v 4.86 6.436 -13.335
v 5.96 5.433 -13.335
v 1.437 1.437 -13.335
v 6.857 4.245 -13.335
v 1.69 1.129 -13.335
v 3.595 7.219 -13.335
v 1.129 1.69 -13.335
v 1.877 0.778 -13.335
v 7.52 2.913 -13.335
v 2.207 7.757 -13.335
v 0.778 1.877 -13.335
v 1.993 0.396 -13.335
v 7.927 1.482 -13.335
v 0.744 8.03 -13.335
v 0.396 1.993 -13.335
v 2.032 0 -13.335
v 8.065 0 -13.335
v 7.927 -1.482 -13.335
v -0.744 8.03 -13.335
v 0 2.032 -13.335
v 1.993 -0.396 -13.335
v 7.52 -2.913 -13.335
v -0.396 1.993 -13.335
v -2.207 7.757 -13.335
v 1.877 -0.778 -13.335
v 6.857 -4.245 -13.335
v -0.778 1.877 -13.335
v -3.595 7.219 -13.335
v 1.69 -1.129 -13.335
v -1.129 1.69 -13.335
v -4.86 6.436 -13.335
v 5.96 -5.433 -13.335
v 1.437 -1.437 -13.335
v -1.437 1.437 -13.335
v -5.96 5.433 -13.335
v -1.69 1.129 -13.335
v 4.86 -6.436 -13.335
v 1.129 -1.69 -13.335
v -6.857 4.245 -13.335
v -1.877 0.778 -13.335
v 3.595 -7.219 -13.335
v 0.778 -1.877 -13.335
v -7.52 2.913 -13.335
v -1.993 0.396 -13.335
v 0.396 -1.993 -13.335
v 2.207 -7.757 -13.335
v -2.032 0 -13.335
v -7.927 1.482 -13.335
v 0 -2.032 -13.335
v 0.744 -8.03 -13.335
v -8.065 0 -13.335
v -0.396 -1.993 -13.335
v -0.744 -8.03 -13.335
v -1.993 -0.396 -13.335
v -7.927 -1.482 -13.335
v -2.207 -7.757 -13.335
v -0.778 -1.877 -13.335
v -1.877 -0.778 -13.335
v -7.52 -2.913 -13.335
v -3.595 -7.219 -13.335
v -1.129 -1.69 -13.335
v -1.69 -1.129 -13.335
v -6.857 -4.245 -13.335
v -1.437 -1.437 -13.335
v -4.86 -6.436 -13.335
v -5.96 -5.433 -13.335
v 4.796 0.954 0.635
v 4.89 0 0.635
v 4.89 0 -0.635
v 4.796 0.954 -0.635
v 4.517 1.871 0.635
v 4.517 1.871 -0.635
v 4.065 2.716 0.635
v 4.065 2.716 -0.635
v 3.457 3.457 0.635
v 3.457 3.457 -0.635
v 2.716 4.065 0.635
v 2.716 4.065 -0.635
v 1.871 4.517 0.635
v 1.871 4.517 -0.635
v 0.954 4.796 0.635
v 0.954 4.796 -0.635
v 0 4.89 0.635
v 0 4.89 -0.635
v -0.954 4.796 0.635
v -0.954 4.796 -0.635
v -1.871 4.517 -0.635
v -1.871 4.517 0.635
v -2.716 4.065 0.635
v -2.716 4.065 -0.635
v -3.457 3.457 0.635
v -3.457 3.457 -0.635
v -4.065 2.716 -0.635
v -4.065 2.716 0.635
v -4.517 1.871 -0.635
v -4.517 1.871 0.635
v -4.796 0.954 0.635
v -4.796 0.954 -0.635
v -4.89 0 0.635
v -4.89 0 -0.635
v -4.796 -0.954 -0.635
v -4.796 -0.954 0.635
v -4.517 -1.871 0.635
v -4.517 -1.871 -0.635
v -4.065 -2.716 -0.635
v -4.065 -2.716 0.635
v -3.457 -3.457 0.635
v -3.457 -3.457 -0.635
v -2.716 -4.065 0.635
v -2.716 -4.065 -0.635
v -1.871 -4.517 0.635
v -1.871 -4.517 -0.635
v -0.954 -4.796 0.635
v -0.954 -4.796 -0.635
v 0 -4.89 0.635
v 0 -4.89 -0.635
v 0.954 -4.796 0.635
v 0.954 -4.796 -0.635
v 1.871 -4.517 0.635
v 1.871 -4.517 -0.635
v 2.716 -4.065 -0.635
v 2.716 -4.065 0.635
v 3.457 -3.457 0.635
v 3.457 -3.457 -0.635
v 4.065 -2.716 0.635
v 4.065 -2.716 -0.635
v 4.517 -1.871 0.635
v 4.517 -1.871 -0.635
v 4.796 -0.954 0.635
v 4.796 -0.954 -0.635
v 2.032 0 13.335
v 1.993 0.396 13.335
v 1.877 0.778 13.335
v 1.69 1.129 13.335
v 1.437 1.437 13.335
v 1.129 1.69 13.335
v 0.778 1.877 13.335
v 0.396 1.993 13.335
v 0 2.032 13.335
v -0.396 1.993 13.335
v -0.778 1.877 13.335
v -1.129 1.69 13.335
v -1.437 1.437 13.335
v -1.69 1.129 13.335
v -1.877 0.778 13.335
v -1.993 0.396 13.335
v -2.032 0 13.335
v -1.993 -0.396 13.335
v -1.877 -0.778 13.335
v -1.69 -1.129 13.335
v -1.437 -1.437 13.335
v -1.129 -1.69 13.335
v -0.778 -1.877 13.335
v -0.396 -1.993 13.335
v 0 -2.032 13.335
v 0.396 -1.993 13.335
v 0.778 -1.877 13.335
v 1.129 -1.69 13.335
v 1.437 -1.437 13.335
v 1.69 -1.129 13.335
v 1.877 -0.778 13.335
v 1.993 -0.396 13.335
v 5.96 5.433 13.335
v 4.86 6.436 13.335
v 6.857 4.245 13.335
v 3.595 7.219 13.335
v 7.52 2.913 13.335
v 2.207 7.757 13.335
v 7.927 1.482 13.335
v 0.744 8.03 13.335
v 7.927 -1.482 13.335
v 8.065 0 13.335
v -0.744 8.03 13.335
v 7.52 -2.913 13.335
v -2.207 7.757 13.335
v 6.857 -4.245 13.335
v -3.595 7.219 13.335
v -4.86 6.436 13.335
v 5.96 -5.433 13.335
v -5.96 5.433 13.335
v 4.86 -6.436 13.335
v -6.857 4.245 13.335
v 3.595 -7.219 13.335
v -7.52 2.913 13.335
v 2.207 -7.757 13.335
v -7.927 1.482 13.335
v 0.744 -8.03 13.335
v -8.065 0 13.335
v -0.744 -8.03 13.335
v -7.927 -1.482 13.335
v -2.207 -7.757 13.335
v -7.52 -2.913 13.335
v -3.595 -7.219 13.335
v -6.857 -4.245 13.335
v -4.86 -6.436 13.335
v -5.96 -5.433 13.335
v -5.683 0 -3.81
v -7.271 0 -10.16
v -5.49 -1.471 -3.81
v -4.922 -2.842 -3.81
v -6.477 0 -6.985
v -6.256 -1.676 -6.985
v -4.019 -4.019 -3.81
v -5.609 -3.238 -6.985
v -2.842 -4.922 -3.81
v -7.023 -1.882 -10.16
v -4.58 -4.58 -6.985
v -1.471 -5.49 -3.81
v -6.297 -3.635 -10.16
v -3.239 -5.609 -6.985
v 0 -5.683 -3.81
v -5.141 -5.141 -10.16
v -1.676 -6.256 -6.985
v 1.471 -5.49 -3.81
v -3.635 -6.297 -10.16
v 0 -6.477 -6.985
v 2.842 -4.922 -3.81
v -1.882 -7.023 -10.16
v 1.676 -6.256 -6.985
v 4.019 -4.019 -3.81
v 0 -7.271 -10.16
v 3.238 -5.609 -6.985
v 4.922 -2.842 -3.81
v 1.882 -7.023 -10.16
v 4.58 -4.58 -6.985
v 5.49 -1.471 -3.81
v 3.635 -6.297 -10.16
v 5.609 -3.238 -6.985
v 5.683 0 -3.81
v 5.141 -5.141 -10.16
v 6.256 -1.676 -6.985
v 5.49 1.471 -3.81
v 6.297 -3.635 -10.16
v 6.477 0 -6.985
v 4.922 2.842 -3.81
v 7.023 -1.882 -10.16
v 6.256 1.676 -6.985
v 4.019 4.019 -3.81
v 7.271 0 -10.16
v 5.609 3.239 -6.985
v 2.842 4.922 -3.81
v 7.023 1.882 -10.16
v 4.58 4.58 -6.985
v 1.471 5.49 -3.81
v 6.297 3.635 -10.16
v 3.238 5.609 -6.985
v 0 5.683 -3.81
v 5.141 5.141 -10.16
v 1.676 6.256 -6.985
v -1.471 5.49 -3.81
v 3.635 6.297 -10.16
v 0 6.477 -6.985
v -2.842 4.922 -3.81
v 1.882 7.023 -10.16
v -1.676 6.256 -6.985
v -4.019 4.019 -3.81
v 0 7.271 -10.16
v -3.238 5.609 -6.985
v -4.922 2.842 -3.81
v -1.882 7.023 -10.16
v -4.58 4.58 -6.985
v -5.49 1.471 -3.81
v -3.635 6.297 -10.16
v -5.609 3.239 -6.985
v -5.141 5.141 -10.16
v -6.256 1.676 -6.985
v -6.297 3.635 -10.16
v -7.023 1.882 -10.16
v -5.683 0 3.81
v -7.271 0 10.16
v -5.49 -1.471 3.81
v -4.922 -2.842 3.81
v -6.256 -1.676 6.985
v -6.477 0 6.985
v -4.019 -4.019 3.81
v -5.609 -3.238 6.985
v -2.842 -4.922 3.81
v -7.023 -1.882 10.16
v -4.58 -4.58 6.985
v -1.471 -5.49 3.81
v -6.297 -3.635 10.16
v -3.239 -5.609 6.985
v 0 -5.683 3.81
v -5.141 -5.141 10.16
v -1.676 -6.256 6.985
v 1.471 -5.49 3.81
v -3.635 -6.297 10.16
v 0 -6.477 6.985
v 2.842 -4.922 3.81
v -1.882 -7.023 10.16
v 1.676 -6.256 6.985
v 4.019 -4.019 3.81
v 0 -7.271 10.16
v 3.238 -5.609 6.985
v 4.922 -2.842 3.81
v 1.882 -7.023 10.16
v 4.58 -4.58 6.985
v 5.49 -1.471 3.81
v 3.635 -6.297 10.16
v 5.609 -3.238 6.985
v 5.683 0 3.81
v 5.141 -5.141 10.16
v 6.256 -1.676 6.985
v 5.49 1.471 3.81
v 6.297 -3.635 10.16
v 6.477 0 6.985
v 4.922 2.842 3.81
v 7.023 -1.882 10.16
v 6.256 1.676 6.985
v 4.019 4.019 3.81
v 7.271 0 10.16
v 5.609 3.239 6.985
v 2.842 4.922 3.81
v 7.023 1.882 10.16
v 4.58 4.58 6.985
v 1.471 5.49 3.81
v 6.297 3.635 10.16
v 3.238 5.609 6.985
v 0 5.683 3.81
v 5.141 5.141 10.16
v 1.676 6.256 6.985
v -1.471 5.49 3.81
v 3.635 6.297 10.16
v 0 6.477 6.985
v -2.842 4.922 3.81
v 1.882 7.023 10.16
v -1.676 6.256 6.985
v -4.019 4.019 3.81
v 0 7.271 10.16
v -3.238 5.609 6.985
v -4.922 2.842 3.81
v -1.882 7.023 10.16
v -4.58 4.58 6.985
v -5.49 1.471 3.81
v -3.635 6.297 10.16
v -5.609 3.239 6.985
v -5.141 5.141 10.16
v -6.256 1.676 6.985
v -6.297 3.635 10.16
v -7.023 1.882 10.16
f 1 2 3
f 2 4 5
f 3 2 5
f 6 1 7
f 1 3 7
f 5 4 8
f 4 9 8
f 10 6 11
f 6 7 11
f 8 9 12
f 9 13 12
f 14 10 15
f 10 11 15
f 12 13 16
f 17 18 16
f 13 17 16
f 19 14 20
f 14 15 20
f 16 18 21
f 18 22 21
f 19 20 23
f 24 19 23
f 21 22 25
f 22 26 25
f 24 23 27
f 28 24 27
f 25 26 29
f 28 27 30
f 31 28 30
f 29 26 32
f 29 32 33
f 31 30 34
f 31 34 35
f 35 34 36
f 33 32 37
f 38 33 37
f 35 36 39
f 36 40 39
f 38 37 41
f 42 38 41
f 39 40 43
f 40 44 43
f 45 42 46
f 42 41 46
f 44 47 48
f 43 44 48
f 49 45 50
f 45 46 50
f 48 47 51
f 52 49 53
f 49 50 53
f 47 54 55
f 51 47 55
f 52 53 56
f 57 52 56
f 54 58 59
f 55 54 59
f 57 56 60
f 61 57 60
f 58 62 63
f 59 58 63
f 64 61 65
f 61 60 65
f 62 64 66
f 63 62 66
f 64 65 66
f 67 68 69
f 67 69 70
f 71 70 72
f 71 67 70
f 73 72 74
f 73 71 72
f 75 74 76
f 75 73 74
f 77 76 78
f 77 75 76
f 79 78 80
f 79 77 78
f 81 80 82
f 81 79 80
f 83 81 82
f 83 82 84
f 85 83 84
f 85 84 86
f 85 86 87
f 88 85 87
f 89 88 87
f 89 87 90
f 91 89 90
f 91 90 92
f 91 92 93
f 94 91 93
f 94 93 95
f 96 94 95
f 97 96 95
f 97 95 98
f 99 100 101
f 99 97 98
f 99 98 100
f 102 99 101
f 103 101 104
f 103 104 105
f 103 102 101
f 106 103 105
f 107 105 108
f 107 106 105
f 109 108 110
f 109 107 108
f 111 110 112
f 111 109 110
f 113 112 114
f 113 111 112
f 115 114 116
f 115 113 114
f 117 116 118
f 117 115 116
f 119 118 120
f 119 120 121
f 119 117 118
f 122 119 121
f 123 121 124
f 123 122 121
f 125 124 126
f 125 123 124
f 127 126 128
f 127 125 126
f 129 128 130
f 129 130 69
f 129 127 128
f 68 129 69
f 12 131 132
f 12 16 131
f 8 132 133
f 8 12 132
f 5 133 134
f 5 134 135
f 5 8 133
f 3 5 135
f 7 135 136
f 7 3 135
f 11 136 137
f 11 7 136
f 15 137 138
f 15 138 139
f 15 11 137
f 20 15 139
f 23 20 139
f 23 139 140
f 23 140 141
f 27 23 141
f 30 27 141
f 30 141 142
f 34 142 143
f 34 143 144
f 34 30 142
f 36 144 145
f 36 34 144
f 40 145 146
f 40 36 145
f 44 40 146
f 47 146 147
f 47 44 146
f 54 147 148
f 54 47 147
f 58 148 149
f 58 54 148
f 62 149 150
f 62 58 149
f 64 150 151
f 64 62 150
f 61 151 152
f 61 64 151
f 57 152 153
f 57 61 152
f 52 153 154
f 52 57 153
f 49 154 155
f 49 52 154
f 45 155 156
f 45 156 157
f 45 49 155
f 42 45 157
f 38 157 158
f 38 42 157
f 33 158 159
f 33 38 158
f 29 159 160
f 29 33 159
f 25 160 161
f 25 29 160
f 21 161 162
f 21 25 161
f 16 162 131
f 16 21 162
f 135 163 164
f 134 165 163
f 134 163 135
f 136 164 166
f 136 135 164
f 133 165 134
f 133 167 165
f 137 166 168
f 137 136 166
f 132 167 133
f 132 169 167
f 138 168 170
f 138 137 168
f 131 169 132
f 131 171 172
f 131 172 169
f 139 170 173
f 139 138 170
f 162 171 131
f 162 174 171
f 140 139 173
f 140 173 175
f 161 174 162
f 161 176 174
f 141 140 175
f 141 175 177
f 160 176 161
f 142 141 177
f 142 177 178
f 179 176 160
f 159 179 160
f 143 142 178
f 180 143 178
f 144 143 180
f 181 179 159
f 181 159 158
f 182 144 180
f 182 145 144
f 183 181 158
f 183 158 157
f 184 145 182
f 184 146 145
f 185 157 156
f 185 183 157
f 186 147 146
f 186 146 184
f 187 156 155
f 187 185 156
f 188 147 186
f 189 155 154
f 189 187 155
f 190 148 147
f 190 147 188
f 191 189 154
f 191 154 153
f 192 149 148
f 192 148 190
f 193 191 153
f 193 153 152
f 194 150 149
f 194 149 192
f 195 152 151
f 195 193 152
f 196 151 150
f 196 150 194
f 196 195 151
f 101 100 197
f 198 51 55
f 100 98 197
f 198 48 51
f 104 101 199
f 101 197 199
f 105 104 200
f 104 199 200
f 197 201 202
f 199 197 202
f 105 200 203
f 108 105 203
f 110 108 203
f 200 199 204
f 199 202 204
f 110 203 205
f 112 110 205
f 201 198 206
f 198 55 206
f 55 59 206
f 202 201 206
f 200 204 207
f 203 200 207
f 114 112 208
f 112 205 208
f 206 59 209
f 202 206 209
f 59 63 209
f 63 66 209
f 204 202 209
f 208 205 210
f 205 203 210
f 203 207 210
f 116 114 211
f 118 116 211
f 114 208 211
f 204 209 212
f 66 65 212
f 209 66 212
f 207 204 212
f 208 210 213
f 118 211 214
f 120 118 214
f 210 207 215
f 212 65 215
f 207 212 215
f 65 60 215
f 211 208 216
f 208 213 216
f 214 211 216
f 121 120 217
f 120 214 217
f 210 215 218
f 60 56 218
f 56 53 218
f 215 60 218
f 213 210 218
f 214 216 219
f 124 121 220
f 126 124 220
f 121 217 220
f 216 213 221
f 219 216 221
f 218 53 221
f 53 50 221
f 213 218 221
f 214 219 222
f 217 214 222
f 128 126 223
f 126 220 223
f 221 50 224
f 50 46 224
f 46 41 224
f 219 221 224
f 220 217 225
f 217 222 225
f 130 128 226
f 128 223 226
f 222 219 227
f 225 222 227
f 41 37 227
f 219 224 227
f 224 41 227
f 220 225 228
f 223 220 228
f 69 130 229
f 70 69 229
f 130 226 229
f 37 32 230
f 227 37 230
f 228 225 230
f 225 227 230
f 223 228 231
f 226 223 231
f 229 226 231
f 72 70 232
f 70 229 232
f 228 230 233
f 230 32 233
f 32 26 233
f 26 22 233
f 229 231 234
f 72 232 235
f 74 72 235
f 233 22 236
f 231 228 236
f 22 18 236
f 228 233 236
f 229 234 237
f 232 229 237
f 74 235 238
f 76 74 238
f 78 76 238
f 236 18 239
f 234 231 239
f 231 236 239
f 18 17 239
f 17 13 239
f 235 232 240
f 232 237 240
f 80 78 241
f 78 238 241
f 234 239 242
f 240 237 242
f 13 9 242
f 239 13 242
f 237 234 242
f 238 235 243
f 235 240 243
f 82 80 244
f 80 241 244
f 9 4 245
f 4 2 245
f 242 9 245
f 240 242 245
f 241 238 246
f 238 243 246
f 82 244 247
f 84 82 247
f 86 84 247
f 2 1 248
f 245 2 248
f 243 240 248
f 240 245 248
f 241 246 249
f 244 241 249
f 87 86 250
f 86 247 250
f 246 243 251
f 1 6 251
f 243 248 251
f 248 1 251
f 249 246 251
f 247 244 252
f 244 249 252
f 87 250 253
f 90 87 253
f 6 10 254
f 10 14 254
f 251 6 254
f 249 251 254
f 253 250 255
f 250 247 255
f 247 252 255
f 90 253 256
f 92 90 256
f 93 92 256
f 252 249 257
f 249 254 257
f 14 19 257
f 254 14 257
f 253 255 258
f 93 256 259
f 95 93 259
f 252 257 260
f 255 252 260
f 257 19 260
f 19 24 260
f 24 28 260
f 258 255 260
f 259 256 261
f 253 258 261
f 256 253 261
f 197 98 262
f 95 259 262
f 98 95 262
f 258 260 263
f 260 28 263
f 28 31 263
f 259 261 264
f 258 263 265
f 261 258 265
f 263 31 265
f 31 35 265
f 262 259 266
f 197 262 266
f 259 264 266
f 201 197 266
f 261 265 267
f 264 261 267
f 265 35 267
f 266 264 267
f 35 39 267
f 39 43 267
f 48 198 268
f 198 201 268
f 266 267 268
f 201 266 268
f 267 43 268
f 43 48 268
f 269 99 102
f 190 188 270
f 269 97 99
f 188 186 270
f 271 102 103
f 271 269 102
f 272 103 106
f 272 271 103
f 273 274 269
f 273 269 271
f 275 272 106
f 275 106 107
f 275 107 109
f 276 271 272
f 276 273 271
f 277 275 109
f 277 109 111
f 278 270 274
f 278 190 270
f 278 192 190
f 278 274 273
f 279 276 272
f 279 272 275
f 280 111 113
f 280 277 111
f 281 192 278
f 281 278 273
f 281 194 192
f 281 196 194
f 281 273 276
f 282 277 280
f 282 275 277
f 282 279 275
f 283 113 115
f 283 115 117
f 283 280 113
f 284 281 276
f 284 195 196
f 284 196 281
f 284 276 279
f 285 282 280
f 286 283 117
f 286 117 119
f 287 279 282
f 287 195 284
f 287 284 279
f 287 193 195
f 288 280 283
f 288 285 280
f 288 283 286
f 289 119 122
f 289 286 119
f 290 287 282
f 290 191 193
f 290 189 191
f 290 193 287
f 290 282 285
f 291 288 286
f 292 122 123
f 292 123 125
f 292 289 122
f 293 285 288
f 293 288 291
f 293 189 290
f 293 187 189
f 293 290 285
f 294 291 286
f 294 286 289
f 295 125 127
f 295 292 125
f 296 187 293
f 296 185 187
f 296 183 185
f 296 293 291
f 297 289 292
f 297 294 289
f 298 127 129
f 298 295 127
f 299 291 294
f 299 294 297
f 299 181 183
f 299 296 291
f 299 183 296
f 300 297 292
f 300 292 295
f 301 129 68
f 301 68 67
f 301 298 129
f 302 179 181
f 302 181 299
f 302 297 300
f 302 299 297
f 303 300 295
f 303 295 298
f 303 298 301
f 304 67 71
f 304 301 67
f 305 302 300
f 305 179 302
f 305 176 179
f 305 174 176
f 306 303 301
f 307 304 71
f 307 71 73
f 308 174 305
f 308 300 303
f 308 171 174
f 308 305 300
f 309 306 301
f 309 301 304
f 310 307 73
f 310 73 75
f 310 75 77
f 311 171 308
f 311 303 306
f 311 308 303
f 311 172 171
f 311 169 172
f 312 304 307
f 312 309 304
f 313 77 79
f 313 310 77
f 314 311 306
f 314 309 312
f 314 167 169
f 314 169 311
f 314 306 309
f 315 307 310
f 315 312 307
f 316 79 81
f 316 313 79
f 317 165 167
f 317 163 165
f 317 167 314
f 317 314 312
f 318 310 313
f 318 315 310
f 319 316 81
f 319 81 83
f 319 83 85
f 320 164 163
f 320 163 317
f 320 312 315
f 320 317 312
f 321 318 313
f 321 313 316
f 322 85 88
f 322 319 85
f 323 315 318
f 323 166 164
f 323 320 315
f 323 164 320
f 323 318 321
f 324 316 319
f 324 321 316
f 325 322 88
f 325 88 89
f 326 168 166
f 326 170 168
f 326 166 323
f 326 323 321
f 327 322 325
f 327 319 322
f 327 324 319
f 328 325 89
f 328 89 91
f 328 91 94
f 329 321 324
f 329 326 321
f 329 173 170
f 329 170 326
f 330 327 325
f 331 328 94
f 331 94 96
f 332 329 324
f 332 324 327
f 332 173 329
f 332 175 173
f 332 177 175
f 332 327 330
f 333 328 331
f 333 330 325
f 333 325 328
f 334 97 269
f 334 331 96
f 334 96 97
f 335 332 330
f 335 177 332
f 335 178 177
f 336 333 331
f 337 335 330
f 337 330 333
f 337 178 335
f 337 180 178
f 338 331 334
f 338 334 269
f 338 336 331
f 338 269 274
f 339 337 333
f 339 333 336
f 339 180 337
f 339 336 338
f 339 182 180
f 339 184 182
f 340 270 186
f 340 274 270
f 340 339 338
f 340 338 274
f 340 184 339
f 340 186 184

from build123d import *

# Parameters (mm, degrees)
ESQUISSE1_R        = 4.8895
ESQUISSE1_R_2      = 2.032
BOSS_EXTRU_1_DEPTH = 13.335


with BuildPart() as part:
    # Esquisse1 → Boss.-Extru.1 (new, symmetric)
    with BuildSketch(Plane.XY):
        Circle(ESQUISSE1_R)
        Circle(ESQUISSE1_R_2, mode=Mode.SUBTRACT)
    extrude(amount=BOSS_EXTRU_1_DEPTH, both=True)

    # Esquisse2 → Révolution1 (revolve)
    with BuildSketch(Plane(origin=(0, 0, 0), x_dir=(0, 0, -1), z_dir=(1, 0, 0)), mode=Mode.PRIVATE) as r_volution1_sk:
        Polygon((-0.635, 4.8895), (-13.335, 8.0645), (-13.335, 4.8895), align=None)
    r_volution1 = revolve(r_volution1_sk.sketch.rotate(Axis((0, 0, 0), (0, 0, 1)), 90), axis=Axis((0, 0, 0), (0, 0, 1)))

    # Symétrie1: Révolution1 across plane
    add(r_volution1.mirror(Plane.XY))


solid = part.part
